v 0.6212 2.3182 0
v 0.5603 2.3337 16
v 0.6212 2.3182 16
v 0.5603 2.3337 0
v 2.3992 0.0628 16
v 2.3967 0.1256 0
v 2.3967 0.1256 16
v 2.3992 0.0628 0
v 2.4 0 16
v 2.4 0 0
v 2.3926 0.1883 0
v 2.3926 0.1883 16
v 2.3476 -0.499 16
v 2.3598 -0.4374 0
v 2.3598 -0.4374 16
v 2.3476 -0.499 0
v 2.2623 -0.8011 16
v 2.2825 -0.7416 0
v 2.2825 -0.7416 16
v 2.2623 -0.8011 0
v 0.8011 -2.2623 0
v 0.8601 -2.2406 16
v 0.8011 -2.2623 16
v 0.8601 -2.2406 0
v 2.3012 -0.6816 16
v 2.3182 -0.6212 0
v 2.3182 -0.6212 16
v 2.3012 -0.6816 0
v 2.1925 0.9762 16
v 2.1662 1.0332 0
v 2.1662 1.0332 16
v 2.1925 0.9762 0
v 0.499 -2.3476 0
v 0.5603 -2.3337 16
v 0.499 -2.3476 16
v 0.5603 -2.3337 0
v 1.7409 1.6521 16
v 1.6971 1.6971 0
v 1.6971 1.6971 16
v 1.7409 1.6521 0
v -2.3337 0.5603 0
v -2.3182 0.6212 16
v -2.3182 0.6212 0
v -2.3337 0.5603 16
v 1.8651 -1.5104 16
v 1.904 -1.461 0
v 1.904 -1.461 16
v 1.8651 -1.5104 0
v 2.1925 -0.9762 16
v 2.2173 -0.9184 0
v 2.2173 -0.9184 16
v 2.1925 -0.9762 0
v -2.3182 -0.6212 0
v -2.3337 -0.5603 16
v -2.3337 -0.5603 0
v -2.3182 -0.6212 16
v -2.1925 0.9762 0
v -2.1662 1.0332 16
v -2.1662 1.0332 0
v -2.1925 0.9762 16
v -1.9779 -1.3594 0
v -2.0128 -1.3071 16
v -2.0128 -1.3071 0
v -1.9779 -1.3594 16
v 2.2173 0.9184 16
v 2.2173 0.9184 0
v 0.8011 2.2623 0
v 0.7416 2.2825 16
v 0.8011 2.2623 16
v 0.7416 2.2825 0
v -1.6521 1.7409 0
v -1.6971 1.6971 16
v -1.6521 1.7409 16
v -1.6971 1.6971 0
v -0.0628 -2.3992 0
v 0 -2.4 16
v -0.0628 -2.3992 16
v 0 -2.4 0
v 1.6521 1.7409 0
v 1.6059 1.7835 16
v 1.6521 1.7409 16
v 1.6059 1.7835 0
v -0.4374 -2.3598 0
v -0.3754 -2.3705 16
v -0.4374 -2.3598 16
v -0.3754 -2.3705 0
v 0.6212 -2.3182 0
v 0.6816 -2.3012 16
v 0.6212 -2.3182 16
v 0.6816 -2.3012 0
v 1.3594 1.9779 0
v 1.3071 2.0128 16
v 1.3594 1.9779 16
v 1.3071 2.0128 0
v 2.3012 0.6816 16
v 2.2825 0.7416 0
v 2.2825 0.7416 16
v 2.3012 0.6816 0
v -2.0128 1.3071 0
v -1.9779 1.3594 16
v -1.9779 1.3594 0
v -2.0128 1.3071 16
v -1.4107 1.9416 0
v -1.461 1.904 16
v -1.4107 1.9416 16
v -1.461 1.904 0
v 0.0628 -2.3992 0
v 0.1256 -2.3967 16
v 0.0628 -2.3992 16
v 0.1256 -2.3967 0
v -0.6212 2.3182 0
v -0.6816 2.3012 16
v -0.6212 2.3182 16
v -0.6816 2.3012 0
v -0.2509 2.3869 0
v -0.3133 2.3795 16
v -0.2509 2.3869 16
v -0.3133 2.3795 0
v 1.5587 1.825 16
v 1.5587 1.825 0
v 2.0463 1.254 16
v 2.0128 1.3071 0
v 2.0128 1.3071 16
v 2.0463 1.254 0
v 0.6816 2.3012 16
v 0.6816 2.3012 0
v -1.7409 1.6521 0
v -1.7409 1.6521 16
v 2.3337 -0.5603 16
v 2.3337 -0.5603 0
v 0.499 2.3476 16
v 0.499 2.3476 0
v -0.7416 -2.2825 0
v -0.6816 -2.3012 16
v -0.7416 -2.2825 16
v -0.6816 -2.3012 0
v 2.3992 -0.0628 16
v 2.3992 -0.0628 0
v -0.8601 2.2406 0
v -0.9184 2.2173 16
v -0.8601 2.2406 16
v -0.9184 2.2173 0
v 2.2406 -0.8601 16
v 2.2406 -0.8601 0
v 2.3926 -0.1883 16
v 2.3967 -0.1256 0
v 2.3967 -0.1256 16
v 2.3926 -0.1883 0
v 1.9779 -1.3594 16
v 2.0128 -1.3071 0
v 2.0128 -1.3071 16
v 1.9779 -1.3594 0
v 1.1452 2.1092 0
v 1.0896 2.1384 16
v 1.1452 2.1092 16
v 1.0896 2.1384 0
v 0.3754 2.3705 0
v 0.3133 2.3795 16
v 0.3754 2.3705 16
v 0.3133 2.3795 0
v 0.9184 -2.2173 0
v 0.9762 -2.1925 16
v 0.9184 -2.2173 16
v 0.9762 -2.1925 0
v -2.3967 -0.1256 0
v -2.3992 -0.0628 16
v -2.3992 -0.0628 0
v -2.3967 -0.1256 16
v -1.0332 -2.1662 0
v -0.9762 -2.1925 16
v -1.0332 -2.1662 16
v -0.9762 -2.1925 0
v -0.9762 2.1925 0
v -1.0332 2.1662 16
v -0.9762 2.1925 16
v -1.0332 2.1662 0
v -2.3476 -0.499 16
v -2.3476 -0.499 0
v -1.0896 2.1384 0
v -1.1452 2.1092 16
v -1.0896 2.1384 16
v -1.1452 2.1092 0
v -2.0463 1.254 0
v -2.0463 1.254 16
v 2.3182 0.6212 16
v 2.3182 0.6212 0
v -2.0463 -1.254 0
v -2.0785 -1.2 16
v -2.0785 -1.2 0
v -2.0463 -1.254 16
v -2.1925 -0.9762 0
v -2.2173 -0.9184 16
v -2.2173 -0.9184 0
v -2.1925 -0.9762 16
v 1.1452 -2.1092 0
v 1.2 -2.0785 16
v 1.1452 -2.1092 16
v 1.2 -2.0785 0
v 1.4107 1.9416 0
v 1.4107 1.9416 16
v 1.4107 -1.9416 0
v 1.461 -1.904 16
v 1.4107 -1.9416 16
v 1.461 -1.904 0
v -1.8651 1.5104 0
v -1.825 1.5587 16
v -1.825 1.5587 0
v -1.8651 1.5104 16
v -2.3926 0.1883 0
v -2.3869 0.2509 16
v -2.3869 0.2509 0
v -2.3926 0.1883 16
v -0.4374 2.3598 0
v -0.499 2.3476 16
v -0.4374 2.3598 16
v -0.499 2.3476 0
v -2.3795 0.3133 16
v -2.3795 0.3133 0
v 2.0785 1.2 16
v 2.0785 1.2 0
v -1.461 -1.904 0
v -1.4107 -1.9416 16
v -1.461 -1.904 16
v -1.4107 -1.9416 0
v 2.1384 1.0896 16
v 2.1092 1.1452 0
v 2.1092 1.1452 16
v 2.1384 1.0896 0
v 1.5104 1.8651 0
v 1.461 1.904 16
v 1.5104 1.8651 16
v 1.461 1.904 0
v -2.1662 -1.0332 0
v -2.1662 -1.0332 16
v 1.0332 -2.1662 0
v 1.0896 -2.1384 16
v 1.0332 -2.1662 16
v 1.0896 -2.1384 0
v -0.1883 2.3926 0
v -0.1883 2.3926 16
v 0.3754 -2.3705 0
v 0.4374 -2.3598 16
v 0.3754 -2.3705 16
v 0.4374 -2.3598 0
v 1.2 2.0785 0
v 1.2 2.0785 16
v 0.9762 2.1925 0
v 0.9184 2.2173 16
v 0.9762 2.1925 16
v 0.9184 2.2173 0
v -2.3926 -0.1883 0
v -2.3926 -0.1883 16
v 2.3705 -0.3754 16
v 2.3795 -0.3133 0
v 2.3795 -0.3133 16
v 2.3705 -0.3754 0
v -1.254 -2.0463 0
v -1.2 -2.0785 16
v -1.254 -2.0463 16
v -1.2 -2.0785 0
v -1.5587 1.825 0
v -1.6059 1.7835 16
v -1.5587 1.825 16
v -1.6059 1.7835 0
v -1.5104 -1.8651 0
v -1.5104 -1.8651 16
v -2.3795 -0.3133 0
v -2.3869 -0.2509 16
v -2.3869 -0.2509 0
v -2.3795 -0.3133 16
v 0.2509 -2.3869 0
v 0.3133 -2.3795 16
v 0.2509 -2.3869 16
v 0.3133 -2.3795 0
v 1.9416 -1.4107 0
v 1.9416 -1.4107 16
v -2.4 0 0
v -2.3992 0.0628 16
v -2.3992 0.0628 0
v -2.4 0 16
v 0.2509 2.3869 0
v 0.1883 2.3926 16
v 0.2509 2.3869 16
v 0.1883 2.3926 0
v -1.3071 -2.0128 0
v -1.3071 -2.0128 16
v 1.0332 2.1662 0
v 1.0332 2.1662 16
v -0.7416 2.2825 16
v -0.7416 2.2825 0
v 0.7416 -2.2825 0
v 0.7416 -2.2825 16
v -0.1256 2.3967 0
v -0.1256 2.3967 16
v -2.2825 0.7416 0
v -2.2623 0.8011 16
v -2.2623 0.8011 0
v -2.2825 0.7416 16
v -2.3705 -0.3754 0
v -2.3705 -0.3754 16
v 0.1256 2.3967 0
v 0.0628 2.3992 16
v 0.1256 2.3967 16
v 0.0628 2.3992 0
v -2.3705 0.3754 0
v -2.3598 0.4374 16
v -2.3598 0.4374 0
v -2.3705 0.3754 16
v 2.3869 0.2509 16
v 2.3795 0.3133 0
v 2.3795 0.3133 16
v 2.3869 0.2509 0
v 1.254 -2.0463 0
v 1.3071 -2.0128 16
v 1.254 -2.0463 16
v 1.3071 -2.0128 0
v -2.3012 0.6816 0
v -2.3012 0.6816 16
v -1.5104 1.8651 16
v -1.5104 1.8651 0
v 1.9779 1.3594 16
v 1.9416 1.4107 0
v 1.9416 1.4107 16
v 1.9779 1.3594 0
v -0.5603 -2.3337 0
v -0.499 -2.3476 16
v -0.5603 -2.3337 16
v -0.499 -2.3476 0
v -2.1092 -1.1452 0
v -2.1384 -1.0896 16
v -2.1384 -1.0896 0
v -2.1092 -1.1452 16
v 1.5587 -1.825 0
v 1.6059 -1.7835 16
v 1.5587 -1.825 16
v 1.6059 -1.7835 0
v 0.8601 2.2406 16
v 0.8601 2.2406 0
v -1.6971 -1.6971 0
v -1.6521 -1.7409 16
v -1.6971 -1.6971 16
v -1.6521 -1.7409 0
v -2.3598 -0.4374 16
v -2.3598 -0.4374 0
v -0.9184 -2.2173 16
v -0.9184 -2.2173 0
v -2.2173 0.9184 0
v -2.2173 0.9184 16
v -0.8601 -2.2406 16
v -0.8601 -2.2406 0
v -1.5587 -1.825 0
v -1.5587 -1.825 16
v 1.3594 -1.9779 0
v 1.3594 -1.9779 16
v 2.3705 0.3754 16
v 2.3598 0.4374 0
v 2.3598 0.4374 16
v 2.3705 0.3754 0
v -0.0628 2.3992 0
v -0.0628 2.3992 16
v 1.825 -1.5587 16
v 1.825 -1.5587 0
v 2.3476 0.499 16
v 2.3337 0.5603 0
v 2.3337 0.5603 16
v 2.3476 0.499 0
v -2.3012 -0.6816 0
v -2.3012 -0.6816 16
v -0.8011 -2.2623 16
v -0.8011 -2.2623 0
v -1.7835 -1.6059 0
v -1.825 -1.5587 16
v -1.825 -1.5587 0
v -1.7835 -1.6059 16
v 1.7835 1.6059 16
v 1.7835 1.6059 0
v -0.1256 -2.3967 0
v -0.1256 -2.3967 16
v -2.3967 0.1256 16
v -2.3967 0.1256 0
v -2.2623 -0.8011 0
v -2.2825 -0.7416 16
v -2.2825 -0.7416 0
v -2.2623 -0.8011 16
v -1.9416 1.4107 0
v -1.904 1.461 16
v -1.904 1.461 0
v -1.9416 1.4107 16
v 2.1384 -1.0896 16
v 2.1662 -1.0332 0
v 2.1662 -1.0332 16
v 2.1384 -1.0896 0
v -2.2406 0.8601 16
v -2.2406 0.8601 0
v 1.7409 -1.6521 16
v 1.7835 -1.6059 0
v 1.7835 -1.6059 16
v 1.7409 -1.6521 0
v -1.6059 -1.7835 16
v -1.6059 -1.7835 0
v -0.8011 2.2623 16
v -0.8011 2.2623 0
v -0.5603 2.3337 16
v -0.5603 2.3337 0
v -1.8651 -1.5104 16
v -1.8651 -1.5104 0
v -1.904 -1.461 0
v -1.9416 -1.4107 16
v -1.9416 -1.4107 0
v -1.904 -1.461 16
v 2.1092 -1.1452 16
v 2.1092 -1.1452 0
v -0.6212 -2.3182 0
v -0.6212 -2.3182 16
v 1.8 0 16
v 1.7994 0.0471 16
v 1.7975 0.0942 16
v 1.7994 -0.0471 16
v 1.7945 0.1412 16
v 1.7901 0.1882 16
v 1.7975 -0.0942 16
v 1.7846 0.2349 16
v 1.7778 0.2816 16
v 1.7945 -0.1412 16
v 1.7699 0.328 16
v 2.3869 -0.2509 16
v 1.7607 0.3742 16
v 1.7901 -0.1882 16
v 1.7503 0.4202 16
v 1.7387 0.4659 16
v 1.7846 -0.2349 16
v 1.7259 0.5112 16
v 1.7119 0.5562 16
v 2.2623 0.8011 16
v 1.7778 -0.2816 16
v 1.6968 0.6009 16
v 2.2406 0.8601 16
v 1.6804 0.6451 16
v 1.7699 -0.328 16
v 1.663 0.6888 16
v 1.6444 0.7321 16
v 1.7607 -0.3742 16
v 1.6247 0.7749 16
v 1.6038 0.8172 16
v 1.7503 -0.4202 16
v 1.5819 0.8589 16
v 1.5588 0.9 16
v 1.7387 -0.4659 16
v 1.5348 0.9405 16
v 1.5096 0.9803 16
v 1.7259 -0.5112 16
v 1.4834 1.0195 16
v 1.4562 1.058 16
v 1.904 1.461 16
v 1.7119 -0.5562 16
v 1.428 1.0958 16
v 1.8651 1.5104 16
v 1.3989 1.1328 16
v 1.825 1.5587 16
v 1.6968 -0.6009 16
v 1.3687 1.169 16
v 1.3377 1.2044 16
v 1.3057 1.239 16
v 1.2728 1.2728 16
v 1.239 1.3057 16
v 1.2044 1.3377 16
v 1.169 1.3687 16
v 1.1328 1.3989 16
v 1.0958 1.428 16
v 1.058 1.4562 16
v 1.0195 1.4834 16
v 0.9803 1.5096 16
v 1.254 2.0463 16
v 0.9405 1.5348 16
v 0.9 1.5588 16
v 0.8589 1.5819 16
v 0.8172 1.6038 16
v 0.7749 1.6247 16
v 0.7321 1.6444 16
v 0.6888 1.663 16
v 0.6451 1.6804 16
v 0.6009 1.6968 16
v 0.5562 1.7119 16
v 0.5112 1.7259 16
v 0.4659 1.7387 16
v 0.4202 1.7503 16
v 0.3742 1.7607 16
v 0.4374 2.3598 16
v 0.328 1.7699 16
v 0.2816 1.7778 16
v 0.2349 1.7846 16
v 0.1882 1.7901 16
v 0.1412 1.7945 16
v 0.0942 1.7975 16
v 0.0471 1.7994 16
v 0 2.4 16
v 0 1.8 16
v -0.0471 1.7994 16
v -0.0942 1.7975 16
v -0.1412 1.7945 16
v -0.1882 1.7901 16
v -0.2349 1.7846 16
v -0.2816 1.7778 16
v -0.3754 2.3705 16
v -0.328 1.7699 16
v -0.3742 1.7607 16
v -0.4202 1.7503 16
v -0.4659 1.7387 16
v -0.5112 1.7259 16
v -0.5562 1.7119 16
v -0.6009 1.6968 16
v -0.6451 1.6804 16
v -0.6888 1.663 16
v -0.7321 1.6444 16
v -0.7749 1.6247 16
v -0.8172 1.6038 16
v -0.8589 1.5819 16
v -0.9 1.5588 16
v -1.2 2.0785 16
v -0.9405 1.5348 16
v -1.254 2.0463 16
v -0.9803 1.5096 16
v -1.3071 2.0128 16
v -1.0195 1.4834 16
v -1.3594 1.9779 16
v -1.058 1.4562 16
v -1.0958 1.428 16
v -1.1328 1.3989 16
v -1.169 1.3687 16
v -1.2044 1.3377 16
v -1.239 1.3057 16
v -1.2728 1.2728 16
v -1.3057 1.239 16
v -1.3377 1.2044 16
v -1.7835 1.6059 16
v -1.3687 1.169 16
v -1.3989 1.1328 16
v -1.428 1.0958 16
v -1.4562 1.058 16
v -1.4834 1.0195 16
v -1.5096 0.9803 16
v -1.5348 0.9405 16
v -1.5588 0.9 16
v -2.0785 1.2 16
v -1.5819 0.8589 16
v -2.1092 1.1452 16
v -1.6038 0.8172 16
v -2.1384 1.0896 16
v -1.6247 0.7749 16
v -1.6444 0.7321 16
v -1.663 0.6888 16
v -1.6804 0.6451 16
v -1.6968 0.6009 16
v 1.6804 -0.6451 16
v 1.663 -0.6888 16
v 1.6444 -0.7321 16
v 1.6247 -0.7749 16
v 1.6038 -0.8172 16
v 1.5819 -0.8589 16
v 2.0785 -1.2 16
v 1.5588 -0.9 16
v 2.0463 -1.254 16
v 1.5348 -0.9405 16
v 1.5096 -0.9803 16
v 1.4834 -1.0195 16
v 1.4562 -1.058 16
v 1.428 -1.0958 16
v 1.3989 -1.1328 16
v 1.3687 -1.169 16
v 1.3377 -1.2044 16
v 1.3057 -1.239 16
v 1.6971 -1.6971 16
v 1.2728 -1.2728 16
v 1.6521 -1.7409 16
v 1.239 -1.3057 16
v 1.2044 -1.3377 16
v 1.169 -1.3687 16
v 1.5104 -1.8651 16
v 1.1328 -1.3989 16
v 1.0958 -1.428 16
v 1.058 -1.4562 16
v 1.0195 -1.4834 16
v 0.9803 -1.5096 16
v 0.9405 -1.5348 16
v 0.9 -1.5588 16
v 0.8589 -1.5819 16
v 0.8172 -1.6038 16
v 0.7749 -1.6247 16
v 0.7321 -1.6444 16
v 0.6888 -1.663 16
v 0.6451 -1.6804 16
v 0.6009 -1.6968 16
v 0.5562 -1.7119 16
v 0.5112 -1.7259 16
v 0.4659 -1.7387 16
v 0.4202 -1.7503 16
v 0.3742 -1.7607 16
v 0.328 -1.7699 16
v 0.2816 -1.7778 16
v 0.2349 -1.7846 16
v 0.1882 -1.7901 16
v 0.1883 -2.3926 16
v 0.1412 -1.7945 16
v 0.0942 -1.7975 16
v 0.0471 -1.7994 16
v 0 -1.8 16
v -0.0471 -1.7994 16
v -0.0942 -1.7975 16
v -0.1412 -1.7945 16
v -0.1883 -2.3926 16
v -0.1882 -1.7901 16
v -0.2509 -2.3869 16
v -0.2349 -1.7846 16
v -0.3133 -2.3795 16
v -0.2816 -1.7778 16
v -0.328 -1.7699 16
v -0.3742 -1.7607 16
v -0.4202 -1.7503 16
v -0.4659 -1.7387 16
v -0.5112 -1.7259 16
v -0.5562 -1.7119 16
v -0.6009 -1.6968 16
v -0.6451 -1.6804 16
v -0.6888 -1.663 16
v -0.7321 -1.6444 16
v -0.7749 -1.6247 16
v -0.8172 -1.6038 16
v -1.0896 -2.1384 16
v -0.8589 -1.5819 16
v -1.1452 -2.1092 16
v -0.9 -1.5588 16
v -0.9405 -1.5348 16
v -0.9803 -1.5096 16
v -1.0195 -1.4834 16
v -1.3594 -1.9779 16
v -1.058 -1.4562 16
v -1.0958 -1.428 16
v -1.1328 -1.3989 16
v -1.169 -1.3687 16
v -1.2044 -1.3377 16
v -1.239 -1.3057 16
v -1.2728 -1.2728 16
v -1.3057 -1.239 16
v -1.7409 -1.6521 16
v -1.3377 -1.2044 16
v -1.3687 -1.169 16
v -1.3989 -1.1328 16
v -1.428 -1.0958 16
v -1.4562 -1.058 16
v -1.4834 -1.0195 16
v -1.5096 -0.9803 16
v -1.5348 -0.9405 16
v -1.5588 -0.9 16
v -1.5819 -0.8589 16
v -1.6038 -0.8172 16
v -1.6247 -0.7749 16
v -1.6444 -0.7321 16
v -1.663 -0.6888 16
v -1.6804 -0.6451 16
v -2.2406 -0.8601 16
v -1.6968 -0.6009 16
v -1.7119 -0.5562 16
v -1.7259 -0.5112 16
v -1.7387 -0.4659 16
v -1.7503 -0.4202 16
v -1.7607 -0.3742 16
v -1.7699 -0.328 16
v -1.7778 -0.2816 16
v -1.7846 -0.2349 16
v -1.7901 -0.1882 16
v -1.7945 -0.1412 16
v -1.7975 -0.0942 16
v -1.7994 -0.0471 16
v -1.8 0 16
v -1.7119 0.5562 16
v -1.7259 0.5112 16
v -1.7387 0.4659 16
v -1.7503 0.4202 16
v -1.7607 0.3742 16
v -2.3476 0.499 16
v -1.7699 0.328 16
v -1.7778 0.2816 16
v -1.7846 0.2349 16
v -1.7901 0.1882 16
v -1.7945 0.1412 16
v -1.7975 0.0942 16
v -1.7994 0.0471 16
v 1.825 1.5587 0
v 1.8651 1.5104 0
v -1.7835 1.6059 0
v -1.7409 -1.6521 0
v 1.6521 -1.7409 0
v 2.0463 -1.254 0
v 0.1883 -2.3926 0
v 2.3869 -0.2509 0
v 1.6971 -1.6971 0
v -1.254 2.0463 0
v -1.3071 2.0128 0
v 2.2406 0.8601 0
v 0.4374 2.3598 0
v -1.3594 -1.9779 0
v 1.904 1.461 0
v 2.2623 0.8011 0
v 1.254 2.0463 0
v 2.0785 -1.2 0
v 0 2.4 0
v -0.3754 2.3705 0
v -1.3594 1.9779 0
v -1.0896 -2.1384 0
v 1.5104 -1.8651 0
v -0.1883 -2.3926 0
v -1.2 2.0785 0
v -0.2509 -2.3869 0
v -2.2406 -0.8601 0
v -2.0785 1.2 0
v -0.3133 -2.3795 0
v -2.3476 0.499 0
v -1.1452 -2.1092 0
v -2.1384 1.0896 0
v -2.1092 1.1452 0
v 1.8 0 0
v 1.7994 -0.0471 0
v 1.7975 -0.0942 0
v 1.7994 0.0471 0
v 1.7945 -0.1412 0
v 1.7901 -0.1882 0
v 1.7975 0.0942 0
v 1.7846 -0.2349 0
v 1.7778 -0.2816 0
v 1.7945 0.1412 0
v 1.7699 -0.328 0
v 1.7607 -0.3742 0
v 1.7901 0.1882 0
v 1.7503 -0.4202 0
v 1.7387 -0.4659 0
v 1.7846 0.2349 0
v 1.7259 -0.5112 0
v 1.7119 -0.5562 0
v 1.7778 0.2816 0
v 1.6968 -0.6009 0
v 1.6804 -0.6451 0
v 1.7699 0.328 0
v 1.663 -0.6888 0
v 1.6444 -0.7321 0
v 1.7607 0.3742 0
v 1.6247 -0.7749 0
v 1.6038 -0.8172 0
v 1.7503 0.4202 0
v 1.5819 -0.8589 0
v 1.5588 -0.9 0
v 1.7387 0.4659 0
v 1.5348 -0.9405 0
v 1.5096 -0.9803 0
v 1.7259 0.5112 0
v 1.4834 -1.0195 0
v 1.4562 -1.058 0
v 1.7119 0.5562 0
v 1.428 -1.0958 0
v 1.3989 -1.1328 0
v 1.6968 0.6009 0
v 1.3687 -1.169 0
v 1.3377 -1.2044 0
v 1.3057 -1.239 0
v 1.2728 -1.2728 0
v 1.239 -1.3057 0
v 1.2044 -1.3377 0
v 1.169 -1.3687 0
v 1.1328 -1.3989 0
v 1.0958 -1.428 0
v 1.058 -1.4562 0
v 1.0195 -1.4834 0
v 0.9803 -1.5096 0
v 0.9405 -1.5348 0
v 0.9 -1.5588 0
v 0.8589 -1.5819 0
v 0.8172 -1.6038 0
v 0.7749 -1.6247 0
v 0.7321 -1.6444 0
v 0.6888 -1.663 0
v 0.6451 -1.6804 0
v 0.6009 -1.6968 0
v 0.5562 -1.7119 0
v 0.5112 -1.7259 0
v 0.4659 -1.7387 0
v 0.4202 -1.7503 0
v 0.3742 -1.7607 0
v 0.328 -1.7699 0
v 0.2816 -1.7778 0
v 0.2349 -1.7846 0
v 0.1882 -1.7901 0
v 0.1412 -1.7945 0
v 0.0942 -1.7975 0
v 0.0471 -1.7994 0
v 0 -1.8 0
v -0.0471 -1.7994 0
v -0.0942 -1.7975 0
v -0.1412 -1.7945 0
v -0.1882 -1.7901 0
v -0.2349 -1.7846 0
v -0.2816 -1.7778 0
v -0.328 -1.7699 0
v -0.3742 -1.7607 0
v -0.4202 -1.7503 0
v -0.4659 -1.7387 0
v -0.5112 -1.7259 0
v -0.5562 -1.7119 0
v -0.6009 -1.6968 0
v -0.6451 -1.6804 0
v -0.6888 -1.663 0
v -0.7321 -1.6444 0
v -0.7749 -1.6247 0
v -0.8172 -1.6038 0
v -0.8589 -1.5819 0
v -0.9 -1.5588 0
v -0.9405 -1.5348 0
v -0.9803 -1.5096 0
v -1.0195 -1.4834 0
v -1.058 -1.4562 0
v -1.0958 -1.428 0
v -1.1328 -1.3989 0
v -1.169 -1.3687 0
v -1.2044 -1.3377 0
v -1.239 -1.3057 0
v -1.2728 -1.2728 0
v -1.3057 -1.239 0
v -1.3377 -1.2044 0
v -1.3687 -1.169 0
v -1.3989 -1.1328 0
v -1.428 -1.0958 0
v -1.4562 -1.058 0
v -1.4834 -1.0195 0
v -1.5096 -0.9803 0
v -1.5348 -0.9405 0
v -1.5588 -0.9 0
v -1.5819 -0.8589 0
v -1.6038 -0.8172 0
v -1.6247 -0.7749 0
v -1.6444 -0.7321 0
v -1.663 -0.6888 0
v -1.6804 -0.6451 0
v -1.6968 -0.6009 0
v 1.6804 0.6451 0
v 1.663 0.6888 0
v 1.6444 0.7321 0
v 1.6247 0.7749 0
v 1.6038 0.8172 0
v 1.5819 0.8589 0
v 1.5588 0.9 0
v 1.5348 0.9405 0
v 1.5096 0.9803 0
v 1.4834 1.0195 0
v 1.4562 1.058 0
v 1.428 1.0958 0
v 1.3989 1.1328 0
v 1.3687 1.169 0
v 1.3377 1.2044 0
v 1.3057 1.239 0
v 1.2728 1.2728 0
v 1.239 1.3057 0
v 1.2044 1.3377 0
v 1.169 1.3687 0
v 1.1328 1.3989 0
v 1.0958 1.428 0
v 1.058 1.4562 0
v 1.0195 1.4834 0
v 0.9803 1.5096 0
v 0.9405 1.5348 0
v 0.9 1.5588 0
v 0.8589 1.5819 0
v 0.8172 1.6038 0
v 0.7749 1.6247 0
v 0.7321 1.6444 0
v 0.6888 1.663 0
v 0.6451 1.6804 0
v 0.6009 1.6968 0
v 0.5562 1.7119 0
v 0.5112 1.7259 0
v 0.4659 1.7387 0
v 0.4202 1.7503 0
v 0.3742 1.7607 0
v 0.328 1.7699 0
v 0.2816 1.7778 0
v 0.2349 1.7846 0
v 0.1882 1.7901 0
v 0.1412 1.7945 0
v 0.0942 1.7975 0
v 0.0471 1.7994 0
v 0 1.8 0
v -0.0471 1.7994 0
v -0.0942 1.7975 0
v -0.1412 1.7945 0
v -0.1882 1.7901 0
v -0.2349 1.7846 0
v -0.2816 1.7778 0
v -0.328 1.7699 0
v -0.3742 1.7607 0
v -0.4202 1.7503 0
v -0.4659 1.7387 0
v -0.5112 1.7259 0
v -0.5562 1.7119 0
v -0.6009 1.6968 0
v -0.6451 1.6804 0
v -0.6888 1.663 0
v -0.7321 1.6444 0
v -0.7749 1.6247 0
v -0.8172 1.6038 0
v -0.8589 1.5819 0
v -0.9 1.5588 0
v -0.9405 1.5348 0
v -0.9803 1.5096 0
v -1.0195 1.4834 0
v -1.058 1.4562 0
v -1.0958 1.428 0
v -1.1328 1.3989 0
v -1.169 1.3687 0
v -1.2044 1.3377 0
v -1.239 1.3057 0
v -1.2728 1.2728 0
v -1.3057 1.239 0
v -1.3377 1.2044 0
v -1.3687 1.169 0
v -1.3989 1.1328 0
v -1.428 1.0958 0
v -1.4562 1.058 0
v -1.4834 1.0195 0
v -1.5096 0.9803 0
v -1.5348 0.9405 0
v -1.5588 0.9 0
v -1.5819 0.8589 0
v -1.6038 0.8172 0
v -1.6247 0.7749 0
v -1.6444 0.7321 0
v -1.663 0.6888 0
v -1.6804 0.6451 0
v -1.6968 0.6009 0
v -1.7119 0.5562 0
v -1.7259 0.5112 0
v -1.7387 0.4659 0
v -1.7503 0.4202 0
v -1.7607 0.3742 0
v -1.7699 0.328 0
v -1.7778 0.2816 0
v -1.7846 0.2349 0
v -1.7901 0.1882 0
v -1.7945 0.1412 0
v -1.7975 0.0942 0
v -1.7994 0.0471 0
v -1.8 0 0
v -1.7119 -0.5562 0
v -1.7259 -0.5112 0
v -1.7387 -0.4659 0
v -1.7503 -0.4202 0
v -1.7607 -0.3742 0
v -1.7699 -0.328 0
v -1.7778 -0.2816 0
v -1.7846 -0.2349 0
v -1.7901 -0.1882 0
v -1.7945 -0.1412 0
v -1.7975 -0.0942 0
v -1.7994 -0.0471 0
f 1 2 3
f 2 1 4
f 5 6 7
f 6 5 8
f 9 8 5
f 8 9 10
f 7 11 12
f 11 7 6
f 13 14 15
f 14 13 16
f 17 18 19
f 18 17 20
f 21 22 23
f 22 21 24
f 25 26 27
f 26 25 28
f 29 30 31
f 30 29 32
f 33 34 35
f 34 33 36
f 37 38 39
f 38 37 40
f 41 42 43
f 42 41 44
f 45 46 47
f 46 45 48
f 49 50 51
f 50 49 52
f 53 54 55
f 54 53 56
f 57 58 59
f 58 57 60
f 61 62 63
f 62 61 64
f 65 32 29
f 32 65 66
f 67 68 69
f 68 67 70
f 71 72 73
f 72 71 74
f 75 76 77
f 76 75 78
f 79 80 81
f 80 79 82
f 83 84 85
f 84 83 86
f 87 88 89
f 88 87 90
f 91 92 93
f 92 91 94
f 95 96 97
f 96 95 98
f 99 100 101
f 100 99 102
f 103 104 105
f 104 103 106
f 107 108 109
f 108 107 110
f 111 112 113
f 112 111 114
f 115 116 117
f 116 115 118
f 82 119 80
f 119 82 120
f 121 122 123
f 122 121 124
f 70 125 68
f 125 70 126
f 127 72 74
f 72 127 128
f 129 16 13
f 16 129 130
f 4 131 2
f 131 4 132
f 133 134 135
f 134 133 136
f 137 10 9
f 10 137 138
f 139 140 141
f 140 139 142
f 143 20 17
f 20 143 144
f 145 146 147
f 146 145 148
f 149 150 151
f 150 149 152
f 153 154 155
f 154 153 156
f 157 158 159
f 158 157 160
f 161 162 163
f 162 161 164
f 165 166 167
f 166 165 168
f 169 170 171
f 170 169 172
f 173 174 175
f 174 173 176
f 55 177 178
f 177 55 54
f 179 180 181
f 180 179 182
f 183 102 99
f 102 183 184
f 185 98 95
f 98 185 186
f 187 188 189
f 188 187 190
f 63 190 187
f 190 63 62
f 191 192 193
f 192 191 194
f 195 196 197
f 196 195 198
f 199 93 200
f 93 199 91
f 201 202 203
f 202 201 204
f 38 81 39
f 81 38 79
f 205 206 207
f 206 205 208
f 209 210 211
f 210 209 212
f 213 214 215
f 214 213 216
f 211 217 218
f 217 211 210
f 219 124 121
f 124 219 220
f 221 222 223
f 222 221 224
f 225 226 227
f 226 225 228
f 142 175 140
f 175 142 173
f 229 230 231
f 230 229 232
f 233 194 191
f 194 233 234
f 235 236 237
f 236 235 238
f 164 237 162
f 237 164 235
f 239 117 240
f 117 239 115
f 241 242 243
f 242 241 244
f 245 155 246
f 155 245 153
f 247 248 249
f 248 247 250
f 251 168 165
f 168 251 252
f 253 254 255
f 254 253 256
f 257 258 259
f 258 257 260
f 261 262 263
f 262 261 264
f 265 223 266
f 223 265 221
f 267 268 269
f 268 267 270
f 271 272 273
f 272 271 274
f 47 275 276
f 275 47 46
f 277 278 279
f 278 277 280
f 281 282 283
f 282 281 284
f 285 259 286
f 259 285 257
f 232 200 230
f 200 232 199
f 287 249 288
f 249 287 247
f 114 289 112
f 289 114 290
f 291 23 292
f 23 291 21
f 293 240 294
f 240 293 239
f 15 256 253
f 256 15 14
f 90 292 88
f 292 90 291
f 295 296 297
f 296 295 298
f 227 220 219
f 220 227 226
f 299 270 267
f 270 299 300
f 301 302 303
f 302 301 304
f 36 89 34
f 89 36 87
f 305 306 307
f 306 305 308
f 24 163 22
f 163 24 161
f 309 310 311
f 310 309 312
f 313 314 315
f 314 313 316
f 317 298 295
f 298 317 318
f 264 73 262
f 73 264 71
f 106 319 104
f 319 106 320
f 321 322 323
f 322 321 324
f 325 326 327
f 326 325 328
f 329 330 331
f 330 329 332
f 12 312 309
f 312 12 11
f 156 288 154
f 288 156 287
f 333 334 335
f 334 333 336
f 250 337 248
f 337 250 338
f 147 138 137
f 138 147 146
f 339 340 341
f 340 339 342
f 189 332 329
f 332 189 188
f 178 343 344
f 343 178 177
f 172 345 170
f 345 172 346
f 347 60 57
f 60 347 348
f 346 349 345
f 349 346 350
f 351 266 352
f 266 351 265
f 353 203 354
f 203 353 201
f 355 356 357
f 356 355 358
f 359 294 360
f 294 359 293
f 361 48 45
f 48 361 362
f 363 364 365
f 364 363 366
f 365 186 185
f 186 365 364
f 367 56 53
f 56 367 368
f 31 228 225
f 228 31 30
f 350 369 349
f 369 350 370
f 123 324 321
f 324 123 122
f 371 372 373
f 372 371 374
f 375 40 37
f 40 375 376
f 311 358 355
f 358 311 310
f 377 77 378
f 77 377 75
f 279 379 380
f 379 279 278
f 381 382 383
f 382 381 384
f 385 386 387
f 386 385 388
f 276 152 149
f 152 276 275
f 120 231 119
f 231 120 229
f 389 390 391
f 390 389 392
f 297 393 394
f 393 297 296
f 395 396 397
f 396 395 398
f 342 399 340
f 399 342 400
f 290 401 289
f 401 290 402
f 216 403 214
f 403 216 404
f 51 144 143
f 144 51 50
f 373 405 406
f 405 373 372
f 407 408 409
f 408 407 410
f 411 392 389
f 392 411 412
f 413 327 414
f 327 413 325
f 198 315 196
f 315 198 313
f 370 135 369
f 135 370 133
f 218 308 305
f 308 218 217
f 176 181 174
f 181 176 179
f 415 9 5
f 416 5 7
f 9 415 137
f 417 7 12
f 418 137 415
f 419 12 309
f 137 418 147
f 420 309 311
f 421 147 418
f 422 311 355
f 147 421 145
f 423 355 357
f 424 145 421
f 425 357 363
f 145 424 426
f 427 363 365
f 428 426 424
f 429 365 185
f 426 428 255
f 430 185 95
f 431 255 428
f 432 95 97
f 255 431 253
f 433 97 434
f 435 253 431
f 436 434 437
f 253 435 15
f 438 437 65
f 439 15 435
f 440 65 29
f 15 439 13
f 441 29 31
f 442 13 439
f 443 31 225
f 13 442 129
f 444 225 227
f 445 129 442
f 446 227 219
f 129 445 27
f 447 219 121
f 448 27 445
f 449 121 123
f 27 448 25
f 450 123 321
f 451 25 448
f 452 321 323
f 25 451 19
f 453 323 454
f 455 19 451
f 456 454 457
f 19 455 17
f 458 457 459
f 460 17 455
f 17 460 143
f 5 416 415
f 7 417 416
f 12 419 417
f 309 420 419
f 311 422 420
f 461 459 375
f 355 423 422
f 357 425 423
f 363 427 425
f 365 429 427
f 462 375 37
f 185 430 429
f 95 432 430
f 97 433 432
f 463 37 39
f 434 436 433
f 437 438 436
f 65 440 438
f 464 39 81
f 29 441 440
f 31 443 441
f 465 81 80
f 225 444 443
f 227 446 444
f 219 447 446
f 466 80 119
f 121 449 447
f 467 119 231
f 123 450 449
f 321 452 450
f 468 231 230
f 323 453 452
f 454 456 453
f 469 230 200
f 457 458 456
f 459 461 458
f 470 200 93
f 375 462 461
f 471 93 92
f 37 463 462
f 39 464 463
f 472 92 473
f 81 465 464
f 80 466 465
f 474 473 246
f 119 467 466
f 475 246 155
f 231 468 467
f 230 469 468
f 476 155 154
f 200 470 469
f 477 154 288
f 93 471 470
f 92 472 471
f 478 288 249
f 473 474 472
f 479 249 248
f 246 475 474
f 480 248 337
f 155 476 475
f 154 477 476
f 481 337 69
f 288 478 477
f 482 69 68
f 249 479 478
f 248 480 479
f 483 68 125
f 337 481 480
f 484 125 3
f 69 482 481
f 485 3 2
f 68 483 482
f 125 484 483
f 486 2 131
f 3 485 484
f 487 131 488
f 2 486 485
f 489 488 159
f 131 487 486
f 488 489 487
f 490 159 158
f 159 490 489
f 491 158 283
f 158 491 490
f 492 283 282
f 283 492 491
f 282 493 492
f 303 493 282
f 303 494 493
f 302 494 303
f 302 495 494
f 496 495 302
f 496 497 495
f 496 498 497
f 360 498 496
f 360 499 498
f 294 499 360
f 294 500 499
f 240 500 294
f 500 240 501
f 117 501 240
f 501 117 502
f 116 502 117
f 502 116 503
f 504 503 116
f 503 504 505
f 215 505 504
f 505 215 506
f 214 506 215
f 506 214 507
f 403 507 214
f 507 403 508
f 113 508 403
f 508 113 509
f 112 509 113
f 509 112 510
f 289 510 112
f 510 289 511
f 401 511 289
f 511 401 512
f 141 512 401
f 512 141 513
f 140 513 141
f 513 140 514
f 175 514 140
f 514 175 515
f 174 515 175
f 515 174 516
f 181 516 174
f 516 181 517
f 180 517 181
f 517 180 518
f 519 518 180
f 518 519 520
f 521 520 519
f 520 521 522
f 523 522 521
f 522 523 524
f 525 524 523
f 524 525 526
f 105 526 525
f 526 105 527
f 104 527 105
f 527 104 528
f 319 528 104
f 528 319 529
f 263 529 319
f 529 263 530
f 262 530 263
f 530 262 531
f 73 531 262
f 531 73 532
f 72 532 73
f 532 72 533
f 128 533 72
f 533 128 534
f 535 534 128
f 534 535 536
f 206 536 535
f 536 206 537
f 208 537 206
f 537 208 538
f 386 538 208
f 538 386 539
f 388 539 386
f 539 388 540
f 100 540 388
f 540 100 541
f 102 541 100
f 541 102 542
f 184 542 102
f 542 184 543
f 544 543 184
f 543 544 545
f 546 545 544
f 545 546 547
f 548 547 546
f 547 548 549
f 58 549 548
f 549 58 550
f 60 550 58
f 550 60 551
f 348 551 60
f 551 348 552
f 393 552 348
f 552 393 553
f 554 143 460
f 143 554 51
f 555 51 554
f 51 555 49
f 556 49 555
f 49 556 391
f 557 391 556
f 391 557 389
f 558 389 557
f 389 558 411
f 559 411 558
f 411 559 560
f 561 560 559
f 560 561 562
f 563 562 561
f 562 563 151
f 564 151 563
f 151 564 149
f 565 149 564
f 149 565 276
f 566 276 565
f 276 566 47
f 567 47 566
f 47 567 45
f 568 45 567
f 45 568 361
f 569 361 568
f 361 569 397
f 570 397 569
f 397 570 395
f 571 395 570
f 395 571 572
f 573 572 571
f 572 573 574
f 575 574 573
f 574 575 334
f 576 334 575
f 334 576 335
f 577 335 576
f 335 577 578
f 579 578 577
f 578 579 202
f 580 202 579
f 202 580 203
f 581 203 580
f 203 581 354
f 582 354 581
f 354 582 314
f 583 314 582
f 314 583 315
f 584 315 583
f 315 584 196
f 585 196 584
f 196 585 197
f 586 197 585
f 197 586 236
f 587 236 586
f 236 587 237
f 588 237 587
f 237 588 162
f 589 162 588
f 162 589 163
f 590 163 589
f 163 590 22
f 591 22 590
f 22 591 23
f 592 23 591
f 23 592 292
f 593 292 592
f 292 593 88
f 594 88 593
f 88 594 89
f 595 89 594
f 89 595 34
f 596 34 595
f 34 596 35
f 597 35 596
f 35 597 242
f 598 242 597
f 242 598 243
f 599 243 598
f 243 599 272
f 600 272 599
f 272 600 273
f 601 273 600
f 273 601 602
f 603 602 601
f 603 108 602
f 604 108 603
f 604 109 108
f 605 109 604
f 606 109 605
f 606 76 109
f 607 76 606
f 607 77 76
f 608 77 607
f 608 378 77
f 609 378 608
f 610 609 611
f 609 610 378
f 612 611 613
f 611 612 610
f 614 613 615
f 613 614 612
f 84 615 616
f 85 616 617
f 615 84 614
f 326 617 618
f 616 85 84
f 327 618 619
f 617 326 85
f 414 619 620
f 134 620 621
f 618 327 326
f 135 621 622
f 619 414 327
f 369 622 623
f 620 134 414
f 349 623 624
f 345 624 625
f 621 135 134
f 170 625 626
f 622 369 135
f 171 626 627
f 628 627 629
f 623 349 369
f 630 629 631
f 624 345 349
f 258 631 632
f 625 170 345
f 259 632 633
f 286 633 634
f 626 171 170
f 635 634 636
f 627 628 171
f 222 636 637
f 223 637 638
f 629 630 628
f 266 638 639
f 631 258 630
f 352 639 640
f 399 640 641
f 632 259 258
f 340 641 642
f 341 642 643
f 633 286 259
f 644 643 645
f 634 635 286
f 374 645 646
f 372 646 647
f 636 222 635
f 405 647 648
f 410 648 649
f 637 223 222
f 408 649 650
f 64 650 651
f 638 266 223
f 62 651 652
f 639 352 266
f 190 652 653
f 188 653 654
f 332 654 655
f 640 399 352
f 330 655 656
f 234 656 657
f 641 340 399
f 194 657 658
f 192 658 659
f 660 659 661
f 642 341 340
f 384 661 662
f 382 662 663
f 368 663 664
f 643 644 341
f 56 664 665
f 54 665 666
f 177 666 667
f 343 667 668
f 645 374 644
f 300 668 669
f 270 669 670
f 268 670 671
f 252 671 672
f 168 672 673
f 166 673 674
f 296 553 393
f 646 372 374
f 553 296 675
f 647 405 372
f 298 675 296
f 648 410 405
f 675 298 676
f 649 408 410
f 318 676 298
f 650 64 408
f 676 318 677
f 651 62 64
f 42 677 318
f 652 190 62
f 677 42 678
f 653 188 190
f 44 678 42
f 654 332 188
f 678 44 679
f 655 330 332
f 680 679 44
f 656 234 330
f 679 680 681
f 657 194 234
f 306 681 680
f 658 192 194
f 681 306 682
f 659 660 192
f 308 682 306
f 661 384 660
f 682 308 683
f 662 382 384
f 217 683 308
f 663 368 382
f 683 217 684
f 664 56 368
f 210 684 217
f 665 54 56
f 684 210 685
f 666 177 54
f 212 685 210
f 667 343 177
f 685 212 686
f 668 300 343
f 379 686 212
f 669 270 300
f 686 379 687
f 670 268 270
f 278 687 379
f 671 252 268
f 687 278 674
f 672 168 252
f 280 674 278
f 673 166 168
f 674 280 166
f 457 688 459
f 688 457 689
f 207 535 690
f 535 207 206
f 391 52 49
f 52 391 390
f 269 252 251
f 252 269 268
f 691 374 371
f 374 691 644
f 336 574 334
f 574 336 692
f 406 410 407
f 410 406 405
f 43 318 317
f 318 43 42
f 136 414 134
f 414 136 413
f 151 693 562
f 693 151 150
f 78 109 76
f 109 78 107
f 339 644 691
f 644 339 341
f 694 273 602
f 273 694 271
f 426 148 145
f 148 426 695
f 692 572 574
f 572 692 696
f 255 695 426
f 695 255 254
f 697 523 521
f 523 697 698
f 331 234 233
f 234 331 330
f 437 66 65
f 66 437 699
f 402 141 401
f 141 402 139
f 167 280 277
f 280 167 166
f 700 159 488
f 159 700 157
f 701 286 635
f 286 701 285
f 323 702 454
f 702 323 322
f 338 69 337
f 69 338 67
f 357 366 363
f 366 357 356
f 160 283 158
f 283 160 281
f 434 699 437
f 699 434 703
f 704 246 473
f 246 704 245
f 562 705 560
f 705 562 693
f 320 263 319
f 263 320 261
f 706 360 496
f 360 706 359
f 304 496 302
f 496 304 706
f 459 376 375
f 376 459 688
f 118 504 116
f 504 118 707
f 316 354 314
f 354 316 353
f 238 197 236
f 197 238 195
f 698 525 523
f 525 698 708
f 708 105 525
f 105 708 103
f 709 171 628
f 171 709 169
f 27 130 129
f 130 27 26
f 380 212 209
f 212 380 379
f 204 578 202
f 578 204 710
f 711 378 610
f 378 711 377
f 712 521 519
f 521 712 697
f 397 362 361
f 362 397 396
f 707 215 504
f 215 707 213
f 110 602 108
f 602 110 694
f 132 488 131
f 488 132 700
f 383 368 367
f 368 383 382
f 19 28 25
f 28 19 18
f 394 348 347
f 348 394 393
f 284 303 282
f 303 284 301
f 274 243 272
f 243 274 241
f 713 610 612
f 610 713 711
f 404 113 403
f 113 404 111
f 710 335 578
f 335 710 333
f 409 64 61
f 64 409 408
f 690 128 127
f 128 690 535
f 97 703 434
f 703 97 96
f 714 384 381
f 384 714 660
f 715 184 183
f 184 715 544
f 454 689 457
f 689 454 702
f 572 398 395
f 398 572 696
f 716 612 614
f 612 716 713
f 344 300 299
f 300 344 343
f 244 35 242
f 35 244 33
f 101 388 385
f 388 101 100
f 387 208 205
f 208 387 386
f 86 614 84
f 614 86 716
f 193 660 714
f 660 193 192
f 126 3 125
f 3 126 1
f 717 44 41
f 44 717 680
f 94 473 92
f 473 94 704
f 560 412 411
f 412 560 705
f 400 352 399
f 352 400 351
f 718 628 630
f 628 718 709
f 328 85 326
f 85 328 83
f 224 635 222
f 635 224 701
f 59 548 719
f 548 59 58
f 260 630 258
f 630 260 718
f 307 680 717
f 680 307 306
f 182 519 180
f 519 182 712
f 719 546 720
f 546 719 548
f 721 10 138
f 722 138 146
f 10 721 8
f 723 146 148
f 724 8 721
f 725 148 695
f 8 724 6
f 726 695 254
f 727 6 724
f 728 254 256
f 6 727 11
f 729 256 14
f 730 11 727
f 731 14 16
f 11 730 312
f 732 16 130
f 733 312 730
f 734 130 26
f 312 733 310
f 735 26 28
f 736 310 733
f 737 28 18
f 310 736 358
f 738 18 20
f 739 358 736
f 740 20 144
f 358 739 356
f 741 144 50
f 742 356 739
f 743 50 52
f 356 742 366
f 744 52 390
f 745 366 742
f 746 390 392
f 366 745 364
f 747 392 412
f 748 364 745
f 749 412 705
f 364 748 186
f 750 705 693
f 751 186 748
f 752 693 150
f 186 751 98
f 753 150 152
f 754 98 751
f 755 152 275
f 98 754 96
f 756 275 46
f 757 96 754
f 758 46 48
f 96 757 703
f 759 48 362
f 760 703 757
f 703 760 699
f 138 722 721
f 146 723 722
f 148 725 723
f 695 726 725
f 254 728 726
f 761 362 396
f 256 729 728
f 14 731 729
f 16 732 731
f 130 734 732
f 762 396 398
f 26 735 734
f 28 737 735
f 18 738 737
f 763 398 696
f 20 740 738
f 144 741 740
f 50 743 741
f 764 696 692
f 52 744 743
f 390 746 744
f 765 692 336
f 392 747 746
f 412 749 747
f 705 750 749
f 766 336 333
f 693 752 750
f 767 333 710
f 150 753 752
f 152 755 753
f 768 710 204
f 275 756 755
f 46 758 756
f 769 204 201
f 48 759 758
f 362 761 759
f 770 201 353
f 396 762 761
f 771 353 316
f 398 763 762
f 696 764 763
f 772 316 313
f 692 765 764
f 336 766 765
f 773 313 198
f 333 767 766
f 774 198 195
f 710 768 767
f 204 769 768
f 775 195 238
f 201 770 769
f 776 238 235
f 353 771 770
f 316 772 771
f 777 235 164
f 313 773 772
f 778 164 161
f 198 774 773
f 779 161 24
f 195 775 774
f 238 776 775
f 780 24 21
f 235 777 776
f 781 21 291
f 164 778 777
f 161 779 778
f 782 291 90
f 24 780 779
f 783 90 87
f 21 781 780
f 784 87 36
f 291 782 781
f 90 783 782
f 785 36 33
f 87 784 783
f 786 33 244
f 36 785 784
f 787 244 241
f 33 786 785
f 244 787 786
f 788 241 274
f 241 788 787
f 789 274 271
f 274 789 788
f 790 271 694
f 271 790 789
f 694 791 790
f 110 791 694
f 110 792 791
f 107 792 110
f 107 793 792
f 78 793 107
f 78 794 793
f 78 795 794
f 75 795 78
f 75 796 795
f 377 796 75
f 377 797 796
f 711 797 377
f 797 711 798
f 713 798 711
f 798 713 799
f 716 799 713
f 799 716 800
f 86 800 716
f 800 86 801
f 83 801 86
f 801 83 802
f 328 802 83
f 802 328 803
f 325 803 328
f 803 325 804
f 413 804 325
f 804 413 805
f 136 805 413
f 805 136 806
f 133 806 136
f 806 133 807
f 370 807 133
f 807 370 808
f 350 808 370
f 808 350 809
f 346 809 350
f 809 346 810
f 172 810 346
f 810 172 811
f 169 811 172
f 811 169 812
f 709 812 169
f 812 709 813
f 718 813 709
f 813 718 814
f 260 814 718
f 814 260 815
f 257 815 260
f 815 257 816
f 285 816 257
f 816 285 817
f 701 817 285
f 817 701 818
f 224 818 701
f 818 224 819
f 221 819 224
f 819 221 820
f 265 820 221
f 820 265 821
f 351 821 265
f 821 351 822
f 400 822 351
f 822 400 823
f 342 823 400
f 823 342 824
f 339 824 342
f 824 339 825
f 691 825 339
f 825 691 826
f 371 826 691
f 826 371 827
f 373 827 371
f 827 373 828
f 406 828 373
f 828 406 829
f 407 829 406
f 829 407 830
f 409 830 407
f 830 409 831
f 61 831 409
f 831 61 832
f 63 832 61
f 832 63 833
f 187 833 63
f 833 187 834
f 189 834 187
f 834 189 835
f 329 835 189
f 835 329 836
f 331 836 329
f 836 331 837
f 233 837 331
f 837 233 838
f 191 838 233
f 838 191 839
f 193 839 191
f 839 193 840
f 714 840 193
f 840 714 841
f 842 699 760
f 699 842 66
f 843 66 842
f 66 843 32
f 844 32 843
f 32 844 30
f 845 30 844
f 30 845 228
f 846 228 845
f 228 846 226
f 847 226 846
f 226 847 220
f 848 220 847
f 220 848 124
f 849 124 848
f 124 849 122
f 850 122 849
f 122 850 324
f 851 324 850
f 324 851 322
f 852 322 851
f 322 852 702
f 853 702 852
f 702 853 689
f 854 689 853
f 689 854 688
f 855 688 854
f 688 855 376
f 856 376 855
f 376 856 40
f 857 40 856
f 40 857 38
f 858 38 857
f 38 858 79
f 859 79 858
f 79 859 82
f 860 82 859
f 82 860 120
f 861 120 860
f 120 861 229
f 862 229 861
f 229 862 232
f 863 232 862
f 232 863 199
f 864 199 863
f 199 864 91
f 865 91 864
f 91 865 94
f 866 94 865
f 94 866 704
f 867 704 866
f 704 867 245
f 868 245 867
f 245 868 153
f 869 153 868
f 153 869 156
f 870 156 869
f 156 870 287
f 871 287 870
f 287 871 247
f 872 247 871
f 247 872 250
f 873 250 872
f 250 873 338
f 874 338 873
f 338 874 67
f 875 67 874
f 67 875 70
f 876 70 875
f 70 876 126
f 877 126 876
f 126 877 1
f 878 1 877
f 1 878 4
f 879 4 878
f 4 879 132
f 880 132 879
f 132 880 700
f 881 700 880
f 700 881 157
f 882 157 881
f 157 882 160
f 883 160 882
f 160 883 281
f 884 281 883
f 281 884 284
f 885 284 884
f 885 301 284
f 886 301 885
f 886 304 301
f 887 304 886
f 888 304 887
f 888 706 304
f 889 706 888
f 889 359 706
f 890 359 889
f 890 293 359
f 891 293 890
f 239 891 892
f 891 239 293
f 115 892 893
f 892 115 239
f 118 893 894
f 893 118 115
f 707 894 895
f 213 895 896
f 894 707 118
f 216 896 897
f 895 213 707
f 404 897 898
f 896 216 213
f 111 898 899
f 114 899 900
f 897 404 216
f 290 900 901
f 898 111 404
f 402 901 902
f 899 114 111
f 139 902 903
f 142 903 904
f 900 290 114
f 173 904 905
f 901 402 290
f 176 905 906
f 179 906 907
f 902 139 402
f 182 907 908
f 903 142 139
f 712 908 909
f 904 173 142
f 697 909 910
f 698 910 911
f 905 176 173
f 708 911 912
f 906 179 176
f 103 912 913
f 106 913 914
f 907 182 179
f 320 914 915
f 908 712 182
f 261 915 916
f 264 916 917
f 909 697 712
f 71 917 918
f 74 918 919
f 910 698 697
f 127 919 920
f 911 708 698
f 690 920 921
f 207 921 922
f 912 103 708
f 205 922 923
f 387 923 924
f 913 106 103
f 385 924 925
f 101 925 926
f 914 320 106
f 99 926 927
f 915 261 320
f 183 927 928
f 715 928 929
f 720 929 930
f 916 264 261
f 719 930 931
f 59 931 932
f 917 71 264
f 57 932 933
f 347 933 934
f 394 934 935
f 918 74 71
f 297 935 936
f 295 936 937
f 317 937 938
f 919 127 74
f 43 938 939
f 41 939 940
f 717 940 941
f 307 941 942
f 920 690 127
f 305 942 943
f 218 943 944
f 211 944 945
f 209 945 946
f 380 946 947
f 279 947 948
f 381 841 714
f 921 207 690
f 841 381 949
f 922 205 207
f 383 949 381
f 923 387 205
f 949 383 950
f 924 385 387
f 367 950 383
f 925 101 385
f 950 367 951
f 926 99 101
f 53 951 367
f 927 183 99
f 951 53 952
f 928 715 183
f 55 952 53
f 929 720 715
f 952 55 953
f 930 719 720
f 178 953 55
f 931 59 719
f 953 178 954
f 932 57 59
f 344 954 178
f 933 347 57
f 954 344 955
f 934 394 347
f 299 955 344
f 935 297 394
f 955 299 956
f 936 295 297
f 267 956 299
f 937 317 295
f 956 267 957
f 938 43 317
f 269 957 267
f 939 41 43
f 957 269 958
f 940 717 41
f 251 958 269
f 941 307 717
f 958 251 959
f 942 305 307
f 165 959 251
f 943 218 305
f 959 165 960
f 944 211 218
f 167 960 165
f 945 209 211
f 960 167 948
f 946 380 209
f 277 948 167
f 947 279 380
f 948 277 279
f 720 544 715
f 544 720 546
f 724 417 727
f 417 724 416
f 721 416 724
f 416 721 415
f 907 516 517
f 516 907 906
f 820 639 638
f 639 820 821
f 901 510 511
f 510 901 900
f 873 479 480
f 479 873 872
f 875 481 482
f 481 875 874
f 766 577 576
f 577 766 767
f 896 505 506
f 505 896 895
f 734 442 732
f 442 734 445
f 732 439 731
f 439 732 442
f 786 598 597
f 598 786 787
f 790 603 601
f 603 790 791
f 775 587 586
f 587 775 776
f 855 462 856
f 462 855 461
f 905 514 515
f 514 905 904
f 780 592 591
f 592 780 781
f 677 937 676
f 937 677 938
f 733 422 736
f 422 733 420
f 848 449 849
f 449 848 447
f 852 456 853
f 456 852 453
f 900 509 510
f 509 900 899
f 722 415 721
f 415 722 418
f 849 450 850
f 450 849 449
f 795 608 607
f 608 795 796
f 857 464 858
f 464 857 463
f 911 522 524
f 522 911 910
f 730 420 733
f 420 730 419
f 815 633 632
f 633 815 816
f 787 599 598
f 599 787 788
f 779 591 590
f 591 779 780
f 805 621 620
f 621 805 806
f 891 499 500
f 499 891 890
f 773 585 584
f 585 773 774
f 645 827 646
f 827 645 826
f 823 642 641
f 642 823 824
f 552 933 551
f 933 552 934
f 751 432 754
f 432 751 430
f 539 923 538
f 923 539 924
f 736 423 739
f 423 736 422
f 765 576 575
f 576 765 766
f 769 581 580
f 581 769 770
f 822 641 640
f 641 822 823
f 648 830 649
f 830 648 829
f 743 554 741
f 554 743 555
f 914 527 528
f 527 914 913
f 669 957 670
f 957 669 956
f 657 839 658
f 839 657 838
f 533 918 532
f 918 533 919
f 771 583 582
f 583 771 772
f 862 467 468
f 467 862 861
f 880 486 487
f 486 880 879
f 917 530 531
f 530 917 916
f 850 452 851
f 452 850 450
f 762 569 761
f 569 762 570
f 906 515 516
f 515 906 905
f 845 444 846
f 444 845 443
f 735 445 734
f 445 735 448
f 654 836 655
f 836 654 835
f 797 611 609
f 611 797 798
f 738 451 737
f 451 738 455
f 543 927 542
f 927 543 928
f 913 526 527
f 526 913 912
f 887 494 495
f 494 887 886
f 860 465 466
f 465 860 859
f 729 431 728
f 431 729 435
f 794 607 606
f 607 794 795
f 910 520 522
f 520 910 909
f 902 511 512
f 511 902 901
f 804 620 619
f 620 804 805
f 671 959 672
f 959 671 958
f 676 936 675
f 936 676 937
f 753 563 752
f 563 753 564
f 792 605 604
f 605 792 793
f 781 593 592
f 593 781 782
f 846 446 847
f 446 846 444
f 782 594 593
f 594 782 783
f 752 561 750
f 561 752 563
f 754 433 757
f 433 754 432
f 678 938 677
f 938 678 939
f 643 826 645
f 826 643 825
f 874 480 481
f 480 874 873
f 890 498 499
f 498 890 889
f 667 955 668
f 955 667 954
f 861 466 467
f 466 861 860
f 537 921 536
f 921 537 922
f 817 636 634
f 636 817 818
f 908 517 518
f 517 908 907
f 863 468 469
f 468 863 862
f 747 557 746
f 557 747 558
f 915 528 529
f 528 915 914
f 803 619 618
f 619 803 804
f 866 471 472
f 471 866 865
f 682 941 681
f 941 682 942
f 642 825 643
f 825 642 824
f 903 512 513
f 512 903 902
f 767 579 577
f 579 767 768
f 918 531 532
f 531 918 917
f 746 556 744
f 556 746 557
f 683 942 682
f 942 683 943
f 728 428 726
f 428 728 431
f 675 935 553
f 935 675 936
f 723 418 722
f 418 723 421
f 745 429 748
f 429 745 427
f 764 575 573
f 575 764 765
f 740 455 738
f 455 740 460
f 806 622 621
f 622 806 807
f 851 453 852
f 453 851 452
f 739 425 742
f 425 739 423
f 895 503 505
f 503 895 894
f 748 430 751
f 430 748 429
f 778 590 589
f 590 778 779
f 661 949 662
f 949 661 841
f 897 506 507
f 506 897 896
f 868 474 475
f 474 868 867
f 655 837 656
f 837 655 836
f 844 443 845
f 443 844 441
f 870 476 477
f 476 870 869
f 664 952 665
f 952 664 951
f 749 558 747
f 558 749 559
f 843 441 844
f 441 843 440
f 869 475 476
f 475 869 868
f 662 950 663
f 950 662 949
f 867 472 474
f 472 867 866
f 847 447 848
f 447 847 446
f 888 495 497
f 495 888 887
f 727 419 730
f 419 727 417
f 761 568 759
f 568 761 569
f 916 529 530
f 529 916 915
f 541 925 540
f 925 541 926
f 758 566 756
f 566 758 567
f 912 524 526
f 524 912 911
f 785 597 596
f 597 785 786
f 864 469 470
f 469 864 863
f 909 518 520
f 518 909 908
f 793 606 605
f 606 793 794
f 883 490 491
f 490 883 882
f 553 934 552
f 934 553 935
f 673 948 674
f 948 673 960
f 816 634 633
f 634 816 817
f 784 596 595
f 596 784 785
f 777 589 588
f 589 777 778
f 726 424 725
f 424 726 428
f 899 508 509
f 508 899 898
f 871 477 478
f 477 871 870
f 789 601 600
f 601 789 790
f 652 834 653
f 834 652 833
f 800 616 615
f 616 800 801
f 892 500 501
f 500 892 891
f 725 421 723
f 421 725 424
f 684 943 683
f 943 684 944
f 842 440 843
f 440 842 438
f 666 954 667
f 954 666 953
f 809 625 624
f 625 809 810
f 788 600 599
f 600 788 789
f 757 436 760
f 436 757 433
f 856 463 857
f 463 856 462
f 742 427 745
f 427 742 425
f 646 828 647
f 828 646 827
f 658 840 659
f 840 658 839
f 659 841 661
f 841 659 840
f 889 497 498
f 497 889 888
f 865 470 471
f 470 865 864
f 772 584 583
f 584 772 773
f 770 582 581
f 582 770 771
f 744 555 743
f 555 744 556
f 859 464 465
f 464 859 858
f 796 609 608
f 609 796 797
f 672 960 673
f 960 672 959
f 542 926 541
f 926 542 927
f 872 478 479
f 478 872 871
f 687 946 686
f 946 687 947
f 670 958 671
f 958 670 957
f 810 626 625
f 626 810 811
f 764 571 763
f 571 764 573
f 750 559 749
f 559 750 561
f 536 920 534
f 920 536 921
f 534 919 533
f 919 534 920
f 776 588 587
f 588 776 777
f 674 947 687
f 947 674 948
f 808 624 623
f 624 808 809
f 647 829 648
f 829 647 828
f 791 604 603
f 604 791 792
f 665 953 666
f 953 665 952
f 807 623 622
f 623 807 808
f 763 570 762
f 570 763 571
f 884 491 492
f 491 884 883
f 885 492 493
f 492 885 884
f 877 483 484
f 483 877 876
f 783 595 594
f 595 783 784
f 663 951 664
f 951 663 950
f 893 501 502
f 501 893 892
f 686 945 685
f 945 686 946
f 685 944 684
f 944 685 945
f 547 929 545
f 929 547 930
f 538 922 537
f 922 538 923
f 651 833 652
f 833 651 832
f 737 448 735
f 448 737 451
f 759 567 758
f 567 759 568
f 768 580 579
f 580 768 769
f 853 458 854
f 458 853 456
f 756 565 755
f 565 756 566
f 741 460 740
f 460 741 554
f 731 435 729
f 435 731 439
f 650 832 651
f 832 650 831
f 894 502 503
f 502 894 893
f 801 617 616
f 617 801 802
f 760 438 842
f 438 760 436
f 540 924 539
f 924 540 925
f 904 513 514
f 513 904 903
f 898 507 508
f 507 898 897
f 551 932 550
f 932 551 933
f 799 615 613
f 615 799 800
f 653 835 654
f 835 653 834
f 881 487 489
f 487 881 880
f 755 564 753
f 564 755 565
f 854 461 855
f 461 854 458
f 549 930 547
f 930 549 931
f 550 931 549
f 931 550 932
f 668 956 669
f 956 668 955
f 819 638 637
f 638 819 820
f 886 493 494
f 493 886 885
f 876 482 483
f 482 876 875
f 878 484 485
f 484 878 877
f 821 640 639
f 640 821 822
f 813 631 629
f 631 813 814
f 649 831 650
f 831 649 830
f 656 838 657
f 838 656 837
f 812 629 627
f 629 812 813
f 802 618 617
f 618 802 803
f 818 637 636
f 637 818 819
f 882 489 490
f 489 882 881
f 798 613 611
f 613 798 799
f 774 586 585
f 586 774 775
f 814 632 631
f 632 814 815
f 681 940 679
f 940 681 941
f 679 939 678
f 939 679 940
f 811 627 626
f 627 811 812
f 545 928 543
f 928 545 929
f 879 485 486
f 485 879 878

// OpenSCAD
// file: nema17.scad
// Basic Nema 17 Stepper Motor

screw_diameter = 3;

motor_base_height = 42;
motor_width = 42;
motor_bevel_width = 54;

motor_center_radius = 11;
motor_center_height = 2;

motor_shaft_length = 20;
motor_shaft_radius = 2.5;

motor_screw_offset = 15.5;
motor_screw_depth = 5;

motor_pully_diameter1 = 16;
motor_pully_diameter2 = 12;
motor_pully_diameter3 = 16;
motor_pully_height1 = 10;
motor_pully_height2 = 5;
motor_pully_height3 = 1;
motor_pully_height = motor_pully_height1 + motor_pully_height2 + motor_pully_height3;

motor_pully_diameter = 16;

motor_height = motor_base_height + motor_center_height + motor_shaft_length;

module motor() {
    
    union() {

    translate([0,0,motor_base_height/2])
    difference(){
        
        // Motor Body
        color([0,0,0])
        intersection(){
            cube([motor_width,motor_width, motor_base_height], center = true);
            rotate([0,0,45]) 
                translate([0,0,-1]) 
                    cube([motor_bevel_width, motor_bevel_width, motor_base_height+2], center = true);
        }
             
            
        // Screw Holes
        color([1/3,1/3,1/3]) 
        for(i=[0:3]){
                rotate([0, 0, 90*i])
                    translate([motor_screw_offset, motor_screw_offset, 0.1-motor_screw_depth+motor_base_height/2]) 
                        cylinder(h=motor_screw_depth, d=screw_diameter, $fn=25);
        }
    }
    // Motor Center
    color([1/3,1/3,1/3]) 
    translate([0, 0, motor_base_height]) 
        cylinder(h=motor_center_height, r=motor_center_radius, $fn=25);
        
    // Motor Shaft
    color([1/3,1/3,1/3]) 
    translate([0, 0, motor_base_height+motor_center_height]) 
        cylinder(h=motor_shaft_length, r=motor_shaft_radius, $fn=25);
    
    // Motor Pully
    color([1/2,1/2,1/2]) 
    translate([0, 0, motor_base_height+motor_center_height+motor_shaft_length-motor_pully_height])  {
            cylinder(h=motor_pully_height1, d=motor_pully_diameter1, $fn=25);
            translate([0,0,motor_pully_height1]) {
                cylinder(h=motor_pully_height2, d=motor_pully_diameter2, $fn=25);
                translate([0,0,motor_pully_height2])
                    cylinder(h=motor_pully_height3, d=motor_pully_diameter3, $fn=25);
            }
        }
    }
}

motor_negative_shaft_diameter = motor_center_radius+1;
module motor_negative(screw_hole_depth=10) {
    extra_space = 0.4;
    
    echo(screw_hole_depth);
    translate([0,0,-motor_base_height])
    union() {

    translate([0,0,motor_base_height*2])
        
        // Motor Body
        translate([0,0,-motor_base_height])
        intersection(){
            cube([motor_width+extra_space,motor_width+extra_space, motor_base_height*2], center = true);
            rotate([0,0,45]) 
                translate([0,0,-1]) 
                    cube([motor_bevel_width+extra_space, motor_bevel_width+extra_space, motor_base_height*2+2], center = true);
        }
            
        // Screw Holes
        for(i=[0:3]){
                rotate([0, 0, 90*i])
                    translate([motor_screw_offset, motor_screw_offset, motor_base_height*2-1]) {
                        cylinder(h=screw_hole_depth+1, d=screw_diameter, $fn=25);
                        translate([0,0, screw_hole_depth+1])
                            cylinder(h=100, d=6, $fn=25);
                            
                    }
    }
    // Motor Center
    translate([0, 0, motor_base_height*2-1]) 
        cylinder(h=101+screw_hole_depth, r=motor_negative_shaft_diameter, $fn=25);
    }
}
// main file
// pulley insert

include <nema17.scad>

outer_diameter = 4.8;
inner_diameter = 3.6;
height = motor_pully_height;

$fn = 240;
module pully_insert() {
    difference() {
        cylinder(d=outer_diameter, h=height);
        cylinder(d=inner_diameter, h=height);
    }
}

pully_insert();
